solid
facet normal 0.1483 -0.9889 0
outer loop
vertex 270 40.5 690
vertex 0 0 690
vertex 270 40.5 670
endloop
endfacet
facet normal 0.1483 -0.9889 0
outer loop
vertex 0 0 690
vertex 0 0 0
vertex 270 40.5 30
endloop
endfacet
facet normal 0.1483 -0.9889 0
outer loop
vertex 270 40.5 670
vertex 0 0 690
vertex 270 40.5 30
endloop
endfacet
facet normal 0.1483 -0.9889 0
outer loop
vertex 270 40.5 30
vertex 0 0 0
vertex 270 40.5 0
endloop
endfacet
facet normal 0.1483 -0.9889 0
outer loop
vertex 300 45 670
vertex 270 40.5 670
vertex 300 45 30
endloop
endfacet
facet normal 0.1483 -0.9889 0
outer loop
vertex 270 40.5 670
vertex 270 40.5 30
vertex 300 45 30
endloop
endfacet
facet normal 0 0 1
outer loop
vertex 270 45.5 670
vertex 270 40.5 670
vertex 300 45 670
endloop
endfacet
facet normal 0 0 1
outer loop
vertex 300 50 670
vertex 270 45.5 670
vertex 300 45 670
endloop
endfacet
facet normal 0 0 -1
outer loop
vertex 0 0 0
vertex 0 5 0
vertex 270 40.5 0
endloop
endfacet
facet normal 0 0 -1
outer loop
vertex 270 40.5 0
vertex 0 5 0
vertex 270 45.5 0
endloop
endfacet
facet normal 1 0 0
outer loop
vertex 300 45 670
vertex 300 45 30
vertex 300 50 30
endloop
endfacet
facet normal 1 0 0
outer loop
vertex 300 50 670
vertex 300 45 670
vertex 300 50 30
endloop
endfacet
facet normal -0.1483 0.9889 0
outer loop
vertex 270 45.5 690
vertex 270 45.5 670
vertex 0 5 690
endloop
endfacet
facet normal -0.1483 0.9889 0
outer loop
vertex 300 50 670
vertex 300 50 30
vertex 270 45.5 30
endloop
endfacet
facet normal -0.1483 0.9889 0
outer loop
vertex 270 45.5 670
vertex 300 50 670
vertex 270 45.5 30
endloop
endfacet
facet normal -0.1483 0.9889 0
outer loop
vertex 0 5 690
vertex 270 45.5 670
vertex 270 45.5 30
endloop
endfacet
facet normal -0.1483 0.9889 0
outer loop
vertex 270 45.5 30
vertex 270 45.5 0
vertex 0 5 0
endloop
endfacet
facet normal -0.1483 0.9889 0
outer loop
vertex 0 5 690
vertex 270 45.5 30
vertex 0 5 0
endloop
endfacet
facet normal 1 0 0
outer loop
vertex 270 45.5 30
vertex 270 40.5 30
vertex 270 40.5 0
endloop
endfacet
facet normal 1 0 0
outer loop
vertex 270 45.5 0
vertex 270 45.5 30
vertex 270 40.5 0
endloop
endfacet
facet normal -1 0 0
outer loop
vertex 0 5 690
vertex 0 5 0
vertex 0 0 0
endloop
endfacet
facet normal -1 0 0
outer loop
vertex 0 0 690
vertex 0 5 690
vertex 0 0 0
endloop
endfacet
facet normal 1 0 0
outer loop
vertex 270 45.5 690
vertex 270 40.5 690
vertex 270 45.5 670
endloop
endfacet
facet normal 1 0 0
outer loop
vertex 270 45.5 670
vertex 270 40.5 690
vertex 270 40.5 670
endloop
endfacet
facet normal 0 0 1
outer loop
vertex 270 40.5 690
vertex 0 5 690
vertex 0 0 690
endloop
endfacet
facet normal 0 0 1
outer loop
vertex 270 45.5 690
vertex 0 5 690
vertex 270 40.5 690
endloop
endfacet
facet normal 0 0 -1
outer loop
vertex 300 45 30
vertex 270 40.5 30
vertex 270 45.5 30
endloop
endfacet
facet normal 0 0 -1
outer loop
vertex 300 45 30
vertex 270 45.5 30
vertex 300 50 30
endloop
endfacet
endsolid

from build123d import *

# Parameters (mm, degrees)
BOSS_EXTRUDE1_DEPTH = 690
SKETCH3_W           = 30
SKETCH3_H           = 20
SKETCH3_H_2         = 30
CUT_EXTRUDE2_DEPTH  = 51


with BuildPart() as part:
    # Sketch1 → Boss-Extrude1 (new body)
    with BuildSketch(Plane.XY):
        Polygon((0, 5), (0, 0), (300, 45), (300, 50), align=None)
    extrude(amount=BOSS_EXTRUDE1_DEPTH)

    # Sketch3 → Cut-Extrude2 (cut, through all)
    with BuildSketch(Plane(origin=(0, 0, 0), x_dir=(1, 0, 0), z_dir=(0, 1, 0))):
        with Locations((285, -680)):
            Rectangle(SKETCH3_W, SKETCH3_H)
        with Locations((285, -15)):
            Rectangle(SKETCH3_W, SKETCH3_H_2)
    extrude(amount=CUT_EXTRUDE2_DEPTH, mode=Mode.SUBTRACT)


solid = part.part
